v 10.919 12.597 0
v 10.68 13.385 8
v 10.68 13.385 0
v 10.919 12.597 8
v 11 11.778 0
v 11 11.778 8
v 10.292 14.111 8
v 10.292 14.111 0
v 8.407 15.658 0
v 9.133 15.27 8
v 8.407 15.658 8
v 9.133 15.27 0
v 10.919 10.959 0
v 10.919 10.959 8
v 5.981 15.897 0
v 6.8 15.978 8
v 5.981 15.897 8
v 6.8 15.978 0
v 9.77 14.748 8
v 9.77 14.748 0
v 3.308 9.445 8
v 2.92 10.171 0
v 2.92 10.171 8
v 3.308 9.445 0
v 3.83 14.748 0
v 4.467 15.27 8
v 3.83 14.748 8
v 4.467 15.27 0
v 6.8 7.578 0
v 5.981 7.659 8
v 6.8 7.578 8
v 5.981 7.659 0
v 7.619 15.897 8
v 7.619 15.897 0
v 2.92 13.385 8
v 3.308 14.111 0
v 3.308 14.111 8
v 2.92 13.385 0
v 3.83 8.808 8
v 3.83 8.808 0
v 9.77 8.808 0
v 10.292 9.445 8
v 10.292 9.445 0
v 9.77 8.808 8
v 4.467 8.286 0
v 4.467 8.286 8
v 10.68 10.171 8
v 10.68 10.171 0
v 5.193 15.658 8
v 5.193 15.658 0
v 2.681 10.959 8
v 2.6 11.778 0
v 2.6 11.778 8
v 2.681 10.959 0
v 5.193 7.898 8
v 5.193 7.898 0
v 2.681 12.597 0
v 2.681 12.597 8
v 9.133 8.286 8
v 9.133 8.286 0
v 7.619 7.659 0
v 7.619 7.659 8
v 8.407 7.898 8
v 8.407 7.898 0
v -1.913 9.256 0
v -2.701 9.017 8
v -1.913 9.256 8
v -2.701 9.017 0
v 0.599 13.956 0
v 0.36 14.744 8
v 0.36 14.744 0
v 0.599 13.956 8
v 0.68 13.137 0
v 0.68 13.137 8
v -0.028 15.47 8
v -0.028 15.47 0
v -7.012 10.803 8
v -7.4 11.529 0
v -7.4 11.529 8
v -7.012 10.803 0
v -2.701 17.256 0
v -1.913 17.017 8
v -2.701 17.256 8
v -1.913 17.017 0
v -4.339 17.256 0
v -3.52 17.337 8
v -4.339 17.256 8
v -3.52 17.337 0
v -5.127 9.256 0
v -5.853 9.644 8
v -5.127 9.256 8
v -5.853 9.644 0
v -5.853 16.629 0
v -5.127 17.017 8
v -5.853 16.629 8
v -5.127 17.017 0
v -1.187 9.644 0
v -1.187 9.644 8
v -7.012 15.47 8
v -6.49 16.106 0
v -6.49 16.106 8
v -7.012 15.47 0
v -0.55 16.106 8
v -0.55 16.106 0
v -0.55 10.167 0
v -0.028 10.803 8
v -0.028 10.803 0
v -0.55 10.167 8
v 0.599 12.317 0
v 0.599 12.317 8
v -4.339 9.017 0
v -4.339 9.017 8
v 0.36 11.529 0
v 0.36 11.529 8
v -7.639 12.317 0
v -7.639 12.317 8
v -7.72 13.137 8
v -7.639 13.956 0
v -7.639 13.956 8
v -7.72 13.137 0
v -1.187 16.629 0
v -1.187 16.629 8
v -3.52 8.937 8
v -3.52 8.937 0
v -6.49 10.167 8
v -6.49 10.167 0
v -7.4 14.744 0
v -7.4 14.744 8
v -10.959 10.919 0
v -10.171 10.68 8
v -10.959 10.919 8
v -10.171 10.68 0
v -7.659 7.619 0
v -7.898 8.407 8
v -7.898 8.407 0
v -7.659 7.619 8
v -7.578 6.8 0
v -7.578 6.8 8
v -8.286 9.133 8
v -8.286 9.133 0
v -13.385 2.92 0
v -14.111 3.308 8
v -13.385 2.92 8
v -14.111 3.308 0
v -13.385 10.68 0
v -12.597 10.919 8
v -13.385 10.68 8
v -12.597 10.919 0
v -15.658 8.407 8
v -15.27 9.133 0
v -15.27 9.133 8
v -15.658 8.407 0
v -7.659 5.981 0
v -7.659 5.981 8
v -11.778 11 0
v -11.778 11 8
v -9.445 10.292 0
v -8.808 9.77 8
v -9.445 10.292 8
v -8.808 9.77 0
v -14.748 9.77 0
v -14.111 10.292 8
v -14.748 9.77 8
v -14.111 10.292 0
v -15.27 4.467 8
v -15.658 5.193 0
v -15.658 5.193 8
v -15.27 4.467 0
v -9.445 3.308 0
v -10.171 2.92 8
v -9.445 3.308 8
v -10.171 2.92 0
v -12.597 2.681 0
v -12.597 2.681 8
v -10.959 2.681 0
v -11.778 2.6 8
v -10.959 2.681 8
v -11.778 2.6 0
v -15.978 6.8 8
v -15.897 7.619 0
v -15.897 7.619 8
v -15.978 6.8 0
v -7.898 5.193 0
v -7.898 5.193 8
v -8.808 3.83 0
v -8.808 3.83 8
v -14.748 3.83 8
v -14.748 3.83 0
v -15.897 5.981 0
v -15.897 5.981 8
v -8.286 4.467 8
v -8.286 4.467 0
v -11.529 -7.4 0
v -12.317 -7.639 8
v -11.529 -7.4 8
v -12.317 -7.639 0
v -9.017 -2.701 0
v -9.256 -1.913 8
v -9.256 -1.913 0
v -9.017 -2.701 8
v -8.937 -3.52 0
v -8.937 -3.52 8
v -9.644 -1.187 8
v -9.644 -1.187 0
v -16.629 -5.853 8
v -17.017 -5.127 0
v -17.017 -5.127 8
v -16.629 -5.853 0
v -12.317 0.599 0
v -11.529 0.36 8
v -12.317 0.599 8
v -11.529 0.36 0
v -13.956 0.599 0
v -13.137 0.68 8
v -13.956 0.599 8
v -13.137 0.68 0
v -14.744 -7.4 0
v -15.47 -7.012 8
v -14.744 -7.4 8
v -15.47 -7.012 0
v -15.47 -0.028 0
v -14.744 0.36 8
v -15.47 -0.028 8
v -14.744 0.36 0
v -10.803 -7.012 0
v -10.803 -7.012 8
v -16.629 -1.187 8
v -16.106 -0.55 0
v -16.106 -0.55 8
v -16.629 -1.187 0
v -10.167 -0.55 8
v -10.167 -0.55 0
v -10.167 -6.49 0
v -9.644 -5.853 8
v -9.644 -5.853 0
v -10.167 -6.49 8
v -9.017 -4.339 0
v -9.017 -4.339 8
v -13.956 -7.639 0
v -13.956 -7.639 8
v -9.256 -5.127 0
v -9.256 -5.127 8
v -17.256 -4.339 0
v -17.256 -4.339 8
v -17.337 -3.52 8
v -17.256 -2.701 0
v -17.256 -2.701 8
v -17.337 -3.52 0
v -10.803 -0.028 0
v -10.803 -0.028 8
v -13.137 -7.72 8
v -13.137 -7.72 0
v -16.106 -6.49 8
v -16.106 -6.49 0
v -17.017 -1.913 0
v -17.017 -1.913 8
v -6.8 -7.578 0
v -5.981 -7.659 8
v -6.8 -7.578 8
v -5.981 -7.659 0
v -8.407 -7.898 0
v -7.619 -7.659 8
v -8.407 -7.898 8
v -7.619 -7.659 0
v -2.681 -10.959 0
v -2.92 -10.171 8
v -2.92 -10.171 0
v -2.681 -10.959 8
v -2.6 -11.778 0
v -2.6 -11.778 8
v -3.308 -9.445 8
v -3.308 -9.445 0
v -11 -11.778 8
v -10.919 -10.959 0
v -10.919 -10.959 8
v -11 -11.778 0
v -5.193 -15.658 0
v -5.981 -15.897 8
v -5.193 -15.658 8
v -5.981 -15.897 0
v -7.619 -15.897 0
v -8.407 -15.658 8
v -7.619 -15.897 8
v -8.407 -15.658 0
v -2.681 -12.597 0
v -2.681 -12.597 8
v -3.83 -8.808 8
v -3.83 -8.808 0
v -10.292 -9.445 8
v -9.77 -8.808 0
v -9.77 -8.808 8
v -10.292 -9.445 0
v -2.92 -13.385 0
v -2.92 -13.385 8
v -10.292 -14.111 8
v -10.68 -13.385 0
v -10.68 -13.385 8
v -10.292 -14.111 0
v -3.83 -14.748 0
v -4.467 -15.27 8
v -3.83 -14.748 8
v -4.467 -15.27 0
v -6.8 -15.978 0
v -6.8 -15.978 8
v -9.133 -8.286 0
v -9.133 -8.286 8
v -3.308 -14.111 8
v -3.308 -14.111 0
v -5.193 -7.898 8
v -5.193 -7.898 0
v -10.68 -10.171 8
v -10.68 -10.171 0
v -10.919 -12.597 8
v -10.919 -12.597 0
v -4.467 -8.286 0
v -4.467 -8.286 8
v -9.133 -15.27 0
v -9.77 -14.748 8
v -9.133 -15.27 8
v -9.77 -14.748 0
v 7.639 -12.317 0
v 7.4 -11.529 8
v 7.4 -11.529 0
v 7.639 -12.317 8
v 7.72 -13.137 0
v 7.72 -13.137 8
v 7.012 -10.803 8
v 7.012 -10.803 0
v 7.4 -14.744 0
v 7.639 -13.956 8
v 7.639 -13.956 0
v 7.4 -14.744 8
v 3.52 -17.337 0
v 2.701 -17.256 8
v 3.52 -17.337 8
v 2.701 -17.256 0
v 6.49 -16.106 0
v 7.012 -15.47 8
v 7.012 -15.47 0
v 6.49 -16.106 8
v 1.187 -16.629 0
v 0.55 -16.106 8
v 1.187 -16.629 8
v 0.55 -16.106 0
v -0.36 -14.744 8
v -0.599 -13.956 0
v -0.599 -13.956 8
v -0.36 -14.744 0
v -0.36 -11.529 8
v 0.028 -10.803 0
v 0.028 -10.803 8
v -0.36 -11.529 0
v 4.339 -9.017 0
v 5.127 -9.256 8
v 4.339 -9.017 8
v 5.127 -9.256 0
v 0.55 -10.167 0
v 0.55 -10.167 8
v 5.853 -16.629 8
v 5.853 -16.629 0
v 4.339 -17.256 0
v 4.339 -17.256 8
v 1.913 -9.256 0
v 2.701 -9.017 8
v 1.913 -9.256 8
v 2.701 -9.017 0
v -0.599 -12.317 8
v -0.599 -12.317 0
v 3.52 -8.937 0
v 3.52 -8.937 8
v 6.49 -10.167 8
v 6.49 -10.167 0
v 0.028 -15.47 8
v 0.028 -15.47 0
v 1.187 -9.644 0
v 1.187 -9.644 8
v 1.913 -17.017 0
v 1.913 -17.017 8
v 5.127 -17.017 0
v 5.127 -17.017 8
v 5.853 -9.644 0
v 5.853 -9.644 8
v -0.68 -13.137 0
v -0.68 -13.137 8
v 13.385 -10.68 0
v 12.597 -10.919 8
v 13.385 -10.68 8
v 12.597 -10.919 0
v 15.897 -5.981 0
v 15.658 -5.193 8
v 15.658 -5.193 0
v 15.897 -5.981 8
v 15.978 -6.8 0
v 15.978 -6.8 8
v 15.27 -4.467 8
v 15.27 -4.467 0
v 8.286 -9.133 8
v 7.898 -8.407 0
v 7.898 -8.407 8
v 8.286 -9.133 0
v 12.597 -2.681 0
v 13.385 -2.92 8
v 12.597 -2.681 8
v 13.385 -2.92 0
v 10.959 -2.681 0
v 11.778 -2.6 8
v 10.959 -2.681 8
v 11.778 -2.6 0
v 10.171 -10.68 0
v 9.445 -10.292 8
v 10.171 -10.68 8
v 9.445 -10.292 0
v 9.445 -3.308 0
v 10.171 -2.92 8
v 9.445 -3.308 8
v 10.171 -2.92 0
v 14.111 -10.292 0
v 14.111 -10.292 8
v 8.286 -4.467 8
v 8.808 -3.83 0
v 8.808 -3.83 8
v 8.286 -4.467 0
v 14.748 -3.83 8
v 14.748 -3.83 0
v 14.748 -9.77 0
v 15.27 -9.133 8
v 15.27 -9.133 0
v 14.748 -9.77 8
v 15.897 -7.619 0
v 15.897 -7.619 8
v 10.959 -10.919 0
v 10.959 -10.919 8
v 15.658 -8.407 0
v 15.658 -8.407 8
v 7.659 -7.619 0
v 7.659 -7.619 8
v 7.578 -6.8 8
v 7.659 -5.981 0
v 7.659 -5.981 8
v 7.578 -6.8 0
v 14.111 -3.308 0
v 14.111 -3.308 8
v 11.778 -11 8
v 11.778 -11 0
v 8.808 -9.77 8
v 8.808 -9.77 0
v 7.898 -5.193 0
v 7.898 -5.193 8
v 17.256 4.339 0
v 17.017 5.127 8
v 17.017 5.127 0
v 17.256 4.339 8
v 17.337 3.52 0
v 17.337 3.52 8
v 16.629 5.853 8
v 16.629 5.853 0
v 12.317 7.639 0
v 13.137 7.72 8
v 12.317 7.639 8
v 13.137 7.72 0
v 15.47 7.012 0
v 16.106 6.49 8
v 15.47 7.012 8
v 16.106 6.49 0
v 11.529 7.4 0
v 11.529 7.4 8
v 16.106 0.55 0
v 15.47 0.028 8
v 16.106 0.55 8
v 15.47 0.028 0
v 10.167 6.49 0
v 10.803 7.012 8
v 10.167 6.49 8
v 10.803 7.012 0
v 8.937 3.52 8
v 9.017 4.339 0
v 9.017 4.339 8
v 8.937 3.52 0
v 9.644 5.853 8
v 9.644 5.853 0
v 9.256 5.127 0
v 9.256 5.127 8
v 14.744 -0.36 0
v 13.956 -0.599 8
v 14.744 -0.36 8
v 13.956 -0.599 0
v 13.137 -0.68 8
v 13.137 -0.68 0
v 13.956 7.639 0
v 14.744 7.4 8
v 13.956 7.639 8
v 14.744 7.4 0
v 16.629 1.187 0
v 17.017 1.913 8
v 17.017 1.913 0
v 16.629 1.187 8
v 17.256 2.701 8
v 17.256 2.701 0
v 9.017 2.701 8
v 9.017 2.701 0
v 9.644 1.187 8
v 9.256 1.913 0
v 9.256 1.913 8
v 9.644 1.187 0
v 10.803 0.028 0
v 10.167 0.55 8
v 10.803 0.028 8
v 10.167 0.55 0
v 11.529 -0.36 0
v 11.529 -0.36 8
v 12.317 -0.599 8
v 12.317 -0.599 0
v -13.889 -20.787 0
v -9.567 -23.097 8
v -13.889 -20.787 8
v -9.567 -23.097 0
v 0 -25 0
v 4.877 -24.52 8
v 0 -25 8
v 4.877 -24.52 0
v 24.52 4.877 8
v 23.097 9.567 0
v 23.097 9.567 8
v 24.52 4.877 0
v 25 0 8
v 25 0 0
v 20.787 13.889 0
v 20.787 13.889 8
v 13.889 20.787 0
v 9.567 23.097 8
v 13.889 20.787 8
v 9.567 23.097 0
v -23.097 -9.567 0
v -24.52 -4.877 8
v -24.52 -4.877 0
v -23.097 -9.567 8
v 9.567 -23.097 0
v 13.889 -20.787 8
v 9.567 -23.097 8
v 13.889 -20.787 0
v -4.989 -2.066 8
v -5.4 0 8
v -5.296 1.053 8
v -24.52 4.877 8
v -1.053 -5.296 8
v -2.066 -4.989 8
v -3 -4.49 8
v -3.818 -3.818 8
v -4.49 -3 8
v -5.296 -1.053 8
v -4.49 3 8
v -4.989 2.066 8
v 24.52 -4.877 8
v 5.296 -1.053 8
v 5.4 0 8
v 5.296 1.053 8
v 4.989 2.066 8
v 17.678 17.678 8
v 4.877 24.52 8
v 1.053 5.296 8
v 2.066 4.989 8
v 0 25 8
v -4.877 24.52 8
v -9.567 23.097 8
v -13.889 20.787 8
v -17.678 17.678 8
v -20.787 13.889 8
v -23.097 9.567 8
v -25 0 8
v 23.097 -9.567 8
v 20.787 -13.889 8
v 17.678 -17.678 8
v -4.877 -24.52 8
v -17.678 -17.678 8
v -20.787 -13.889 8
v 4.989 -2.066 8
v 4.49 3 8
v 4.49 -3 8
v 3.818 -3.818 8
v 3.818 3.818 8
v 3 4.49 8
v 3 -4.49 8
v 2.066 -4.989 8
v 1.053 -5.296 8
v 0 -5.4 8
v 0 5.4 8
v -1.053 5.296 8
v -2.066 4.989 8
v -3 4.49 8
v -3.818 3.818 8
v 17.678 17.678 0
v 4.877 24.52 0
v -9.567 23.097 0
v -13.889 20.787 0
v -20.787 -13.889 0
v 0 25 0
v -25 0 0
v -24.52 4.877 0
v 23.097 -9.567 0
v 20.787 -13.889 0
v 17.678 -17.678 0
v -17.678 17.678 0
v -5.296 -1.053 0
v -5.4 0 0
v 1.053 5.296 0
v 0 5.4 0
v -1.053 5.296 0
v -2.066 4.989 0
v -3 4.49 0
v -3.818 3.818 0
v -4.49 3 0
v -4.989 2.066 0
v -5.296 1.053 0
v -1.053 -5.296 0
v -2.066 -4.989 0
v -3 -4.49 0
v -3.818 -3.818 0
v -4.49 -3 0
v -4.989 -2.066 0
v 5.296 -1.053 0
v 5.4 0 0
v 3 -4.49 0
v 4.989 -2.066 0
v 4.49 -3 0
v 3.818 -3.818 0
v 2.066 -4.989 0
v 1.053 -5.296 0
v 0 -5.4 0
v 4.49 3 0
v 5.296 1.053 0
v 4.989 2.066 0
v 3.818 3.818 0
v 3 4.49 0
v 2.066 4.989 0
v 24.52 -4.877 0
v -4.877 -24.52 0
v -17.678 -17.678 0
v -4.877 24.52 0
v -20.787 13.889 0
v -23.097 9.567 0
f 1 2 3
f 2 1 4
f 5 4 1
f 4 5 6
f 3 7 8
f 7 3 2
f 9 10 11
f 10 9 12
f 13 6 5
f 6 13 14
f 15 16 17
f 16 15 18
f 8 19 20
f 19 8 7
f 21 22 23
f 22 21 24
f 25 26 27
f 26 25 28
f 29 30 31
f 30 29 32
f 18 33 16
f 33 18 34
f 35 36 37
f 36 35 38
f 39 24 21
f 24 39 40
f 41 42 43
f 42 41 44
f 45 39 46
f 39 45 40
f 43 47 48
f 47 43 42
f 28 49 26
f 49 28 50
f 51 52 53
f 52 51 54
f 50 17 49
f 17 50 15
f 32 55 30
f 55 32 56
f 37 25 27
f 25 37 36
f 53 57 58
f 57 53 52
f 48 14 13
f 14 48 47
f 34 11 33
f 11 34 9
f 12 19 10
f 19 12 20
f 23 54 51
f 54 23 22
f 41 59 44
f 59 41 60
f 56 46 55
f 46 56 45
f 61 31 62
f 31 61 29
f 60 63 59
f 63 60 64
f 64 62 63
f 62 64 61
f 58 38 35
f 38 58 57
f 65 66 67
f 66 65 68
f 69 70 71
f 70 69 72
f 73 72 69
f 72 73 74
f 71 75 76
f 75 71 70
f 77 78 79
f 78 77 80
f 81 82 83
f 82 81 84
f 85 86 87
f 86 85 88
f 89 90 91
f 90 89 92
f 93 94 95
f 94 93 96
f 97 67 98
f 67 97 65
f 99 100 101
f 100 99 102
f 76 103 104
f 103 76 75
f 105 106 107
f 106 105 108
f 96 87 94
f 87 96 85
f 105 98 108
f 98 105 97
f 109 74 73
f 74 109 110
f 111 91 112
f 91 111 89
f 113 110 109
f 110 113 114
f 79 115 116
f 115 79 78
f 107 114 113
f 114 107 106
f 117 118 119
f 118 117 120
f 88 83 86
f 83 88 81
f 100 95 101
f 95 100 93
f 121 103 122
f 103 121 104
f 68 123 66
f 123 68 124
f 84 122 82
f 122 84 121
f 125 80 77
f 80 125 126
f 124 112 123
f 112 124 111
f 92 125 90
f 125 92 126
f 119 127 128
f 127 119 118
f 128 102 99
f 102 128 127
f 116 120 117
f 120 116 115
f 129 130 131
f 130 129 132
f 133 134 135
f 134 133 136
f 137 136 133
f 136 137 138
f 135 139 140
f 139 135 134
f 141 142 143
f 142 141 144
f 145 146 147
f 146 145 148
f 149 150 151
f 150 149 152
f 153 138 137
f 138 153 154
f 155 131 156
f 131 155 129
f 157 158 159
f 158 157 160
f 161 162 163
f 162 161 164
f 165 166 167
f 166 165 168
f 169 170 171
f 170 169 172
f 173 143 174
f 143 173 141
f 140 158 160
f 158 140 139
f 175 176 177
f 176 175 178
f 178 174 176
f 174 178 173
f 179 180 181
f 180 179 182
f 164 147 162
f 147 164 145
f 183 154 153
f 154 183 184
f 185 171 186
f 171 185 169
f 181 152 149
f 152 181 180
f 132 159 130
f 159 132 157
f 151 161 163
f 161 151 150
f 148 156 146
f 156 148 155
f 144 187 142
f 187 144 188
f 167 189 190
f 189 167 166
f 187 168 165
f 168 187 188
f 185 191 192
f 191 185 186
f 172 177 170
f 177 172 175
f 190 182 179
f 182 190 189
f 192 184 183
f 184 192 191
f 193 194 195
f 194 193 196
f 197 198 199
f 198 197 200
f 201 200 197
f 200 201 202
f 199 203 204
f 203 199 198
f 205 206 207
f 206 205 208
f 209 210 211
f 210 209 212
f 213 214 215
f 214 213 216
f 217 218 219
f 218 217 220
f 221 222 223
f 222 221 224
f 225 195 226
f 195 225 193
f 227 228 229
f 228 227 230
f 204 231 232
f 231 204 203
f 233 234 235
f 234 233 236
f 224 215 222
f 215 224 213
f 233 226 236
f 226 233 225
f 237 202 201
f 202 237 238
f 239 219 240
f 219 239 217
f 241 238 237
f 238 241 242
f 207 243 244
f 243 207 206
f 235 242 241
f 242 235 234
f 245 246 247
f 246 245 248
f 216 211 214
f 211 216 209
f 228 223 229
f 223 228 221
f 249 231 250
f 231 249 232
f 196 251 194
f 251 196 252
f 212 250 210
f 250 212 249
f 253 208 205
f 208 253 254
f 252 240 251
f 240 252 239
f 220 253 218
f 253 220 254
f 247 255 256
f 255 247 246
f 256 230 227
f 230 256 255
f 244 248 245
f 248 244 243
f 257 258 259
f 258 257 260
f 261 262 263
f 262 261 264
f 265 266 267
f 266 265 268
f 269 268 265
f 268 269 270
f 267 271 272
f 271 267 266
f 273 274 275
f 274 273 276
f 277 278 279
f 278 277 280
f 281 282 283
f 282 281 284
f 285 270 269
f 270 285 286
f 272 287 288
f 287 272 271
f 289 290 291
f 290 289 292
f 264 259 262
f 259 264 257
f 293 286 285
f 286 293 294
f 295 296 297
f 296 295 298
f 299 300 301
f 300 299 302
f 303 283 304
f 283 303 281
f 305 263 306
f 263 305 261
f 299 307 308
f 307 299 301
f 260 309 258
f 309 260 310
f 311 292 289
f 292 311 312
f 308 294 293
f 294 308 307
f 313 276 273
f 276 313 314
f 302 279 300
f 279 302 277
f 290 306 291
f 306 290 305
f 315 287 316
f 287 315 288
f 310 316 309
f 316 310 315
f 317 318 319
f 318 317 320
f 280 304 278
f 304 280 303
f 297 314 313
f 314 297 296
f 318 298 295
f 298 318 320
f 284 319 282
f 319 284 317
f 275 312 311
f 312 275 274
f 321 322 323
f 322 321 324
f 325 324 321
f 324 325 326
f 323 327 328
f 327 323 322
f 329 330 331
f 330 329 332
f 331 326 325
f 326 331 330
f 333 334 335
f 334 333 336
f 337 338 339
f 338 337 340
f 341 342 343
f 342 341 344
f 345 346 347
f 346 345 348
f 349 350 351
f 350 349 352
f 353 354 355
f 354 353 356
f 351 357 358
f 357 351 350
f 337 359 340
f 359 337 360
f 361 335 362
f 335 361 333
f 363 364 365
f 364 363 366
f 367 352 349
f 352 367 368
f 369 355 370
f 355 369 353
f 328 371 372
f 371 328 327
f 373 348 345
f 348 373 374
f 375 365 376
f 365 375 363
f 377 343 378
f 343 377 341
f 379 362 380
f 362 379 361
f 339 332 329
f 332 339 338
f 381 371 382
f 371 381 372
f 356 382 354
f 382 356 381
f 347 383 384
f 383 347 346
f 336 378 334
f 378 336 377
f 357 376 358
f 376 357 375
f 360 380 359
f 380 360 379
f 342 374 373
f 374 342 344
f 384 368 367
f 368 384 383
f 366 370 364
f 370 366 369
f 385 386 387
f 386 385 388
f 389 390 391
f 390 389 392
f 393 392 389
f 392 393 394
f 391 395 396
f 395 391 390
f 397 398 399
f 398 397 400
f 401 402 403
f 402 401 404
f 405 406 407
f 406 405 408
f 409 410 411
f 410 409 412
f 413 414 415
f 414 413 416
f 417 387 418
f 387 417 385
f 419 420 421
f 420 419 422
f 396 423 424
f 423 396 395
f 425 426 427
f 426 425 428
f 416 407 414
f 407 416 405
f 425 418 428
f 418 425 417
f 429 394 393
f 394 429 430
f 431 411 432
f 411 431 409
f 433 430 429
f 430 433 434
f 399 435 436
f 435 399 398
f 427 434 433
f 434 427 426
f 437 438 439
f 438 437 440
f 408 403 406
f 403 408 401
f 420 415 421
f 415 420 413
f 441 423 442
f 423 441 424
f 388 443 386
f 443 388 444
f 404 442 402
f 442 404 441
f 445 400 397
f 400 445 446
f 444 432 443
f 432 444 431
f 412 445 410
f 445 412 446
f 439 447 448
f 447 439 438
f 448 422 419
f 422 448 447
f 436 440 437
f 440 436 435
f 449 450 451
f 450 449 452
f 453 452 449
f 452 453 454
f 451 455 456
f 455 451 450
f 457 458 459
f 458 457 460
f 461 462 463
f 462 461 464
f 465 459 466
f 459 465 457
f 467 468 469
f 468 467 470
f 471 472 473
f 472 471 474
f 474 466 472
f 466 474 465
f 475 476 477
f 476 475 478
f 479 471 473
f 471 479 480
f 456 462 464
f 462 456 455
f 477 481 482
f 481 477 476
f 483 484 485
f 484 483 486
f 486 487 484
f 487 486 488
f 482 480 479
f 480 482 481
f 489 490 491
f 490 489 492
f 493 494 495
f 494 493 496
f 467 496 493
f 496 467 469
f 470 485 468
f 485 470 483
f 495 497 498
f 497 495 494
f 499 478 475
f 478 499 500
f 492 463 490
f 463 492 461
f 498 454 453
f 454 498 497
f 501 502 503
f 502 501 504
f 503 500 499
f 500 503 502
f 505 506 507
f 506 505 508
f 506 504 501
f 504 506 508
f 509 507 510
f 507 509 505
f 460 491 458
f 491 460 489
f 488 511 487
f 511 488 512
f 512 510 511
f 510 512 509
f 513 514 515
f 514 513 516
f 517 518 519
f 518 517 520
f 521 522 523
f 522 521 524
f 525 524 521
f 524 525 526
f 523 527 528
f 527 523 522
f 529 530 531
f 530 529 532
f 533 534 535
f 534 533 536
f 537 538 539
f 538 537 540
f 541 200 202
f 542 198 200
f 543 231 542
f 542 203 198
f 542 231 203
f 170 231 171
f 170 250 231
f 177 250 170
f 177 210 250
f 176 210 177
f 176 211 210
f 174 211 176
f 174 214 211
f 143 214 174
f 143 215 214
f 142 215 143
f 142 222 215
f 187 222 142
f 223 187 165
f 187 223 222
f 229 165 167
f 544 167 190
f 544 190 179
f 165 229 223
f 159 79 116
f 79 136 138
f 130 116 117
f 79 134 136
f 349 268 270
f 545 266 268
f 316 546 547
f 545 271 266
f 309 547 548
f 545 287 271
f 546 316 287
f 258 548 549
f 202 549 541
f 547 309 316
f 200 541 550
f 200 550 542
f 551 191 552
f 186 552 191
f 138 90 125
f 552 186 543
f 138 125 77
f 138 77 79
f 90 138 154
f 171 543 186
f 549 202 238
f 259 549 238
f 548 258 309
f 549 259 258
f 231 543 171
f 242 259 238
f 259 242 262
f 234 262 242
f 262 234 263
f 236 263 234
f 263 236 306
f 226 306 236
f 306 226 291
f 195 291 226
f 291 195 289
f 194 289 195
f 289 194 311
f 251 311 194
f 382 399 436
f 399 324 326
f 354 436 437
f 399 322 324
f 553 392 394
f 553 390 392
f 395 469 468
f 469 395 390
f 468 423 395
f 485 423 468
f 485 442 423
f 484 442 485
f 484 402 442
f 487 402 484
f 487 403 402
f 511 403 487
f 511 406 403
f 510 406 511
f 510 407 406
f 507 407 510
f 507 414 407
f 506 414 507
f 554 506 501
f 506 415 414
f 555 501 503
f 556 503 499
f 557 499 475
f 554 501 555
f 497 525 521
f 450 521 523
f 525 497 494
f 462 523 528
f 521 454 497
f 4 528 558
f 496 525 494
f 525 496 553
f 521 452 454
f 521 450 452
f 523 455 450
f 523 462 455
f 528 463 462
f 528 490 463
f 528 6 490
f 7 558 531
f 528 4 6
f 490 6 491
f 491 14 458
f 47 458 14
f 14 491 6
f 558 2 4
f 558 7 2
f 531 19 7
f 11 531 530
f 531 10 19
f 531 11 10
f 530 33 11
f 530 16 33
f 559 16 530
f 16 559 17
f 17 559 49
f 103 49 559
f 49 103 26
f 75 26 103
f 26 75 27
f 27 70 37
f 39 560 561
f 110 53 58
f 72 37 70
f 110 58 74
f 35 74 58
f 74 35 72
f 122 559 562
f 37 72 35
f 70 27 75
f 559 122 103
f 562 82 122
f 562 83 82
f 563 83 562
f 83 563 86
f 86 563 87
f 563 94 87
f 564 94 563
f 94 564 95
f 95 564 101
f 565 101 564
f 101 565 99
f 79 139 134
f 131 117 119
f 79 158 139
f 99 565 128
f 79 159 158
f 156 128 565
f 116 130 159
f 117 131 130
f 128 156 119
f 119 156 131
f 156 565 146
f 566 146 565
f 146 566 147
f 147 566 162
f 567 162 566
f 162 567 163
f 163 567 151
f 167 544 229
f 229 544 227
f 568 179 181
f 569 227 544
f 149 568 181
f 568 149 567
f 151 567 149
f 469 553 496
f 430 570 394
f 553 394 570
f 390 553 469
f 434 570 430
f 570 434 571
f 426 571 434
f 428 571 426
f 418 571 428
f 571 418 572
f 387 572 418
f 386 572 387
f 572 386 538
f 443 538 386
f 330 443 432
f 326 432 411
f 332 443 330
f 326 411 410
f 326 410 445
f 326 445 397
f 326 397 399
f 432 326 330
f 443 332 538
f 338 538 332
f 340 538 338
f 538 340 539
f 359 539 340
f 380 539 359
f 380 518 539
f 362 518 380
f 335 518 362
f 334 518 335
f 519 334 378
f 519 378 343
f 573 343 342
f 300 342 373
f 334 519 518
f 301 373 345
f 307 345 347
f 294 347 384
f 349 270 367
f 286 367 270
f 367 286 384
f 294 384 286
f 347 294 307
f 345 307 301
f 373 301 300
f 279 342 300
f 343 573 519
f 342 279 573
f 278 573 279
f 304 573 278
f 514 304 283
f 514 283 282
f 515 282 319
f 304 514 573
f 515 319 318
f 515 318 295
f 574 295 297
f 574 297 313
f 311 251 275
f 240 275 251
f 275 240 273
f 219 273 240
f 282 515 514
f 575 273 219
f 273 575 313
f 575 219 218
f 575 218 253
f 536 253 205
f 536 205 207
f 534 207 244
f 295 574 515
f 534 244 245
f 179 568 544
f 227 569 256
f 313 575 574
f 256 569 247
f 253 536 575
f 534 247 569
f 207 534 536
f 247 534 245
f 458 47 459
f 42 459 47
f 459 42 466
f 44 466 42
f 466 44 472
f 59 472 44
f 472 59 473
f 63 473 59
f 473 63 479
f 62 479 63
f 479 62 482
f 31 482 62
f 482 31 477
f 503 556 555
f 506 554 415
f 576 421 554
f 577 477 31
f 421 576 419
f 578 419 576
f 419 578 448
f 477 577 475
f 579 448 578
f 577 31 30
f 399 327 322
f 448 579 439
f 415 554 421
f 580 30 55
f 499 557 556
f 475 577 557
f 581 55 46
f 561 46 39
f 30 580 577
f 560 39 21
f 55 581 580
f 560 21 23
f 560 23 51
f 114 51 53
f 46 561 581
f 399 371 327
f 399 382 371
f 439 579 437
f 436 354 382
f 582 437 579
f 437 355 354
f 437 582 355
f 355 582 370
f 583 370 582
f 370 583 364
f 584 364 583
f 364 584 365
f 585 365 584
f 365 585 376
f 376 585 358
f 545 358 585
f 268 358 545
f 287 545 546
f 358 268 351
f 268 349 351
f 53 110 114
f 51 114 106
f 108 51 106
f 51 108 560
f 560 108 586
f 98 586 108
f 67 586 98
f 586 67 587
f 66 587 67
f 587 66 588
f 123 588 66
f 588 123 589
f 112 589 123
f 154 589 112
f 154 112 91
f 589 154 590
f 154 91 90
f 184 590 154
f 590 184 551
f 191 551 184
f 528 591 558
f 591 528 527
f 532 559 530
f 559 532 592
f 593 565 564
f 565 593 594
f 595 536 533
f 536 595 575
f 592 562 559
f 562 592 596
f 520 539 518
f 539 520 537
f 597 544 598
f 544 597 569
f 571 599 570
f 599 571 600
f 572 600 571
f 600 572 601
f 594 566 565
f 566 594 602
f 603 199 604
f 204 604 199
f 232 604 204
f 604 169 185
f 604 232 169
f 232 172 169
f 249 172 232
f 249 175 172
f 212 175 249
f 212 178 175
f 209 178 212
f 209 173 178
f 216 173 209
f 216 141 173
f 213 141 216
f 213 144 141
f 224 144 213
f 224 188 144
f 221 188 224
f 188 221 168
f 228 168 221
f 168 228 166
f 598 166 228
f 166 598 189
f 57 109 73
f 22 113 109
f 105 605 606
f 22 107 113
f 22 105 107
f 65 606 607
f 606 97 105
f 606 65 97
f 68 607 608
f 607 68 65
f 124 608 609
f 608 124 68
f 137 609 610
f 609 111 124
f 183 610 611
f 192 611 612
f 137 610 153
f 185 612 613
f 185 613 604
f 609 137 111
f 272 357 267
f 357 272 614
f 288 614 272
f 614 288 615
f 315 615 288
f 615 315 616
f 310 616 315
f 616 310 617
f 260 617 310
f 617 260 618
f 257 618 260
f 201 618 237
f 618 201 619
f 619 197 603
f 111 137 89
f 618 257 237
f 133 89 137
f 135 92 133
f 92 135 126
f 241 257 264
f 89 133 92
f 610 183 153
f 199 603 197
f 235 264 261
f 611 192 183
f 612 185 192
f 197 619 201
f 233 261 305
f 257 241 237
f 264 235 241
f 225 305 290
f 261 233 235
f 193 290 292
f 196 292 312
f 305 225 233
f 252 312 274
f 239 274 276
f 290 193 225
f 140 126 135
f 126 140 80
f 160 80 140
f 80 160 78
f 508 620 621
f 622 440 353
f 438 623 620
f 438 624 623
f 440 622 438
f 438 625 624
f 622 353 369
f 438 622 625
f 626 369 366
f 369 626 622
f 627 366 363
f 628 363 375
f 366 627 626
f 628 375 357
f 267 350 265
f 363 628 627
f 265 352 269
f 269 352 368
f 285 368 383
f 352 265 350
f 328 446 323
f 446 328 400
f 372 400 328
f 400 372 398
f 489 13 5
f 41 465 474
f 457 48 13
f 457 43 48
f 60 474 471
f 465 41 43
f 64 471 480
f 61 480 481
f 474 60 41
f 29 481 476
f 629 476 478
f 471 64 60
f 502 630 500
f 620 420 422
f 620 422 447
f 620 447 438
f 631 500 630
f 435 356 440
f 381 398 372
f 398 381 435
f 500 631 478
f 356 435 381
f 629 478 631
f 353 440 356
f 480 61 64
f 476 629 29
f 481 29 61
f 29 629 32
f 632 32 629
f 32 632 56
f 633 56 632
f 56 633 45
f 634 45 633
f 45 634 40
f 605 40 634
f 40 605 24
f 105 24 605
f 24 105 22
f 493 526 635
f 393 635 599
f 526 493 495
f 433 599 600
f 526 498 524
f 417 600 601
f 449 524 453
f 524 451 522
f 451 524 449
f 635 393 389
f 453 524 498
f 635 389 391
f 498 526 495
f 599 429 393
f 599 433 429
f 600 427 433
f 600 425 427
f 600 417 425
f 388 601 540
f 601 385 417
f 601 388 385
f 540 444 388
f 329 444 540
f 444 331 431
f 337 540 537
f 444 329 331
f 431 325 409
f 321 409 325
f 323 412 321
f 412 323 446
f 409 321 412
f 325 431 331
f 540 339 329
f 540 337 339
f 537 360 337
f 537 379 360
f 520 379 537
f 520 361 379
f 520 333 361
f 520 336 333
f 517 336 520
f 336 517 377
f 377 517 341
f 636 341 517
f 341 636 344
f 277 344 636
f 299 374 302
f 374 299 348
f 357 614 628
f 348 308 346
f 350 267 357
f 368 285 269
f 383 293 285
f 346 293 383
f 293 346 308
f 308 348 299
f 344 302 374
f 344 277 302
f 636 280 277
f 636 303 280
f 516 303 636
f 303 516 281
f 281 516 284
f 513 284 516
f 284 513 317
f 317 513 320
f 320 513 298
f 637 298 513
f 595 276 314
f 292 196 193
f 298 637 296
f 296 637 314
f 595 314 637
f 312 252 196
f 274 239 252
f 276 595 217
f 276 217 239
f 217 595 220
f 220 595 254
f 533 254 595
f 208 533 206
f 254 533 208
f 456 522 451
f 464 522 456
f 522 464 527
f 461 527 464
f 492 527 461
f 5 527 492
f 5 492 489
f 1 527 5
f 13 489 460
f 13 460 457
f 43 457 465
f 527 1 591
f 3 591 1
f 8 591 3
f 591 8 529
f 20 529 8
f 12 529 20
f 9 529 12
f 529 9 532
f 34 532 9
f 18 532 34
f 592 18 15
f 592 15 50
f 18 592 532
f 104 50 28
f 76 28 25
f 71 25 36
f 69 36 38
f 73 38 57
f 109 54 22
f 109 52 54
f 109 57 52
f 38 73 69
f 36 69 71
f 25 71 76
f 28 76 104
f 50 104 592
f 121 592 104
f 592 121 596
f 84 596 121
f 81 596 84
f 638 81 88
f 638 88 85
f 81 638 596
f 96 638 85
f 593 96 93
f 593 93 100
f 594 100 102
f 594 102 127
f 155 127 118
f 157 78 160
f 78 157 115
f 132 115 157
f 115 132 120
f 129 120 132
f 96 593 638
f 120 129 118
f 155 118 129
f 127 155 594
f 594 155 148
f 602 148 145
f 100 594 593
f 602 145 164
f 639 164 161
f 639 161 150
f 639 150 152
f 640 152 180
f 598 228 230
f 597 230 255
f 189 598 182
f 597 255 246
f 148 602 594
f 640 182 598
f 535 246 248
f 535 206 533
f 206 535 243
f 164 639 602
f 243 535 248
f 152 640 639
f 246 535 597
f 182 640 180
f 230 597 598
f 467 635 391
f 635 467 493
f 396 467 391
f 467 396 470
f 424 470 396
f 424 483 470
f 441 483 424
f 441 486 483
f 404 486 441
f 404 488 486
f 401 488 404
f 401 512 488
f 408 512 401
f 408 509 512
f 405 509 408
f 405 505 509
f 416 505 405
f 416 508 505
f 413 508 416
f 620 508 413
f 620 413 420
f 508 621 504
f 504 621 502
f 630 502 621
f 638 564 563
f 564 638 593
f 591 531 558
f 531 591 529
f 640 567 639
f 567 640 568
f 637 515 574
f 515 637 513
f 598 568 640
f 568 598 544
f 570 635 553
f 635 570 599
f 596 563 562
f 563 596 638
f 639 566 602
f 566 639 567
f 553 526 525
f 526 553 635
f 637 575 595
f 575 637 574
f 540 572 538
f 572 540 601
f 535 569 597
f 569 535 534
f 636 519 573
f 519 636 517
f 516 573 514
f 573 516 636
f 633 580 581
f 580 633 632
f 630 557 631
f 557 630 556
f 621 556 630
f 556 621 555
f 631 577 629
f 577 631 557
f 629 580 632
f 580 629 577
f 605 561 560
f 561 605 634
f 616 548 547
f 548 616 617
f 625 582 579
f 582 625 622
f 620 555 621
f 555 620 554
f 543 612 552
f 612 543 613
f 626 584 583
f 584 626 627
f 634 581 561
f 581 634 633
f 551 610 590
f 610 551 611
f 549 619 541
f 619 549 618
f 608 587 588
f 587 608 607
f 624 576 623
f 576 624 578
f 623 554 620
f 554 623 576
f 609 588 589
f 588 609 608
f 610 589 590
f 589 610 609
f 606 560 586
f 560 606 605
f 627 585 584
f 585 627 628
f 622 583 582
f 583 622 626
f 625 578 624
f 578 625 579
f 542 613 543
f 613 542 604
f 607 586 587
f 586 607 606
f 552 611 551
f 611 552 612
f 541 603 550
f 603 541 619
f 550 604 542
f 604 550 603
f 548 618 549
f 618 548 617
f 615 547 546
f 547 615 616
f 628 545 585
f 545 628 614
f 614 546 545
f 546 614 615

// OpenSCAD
$fn = 32;

// ----------------------------------------------------------------------
// Flange Ø50 x 8
// 8 holes on a Ø27.2 bolt circle, bolted joints
// ----------------------------------------------------------------------

// --- parameters (mm) ---
flange_d = 50;   // outside diameter of the flange
thickness = 8;   // flange thickness
holes = 8;       // number of bolt holes
pcd = 27.2;      // bolt circle diameter
start_deg = 60;  // angle of the first hole, from +X
hole_d = 8.4;    // bolt hole diameter
bore_d = 10.8;   // central through bore
hub_d = 18.8;    // hub outside diameter
hub_h = 0;       // hub height above the flange face (0 = no hub)

// --- derived feature positions (mm) ---
height = thickness + hub_h;  // = 8   overall height of the part
pcd_r = pcd / 2;             // = 13.6   bolt circle radius
hole_step = 360 / holes;     // = 45   angular pitch
feature_centers = [
  [pcd_r * cos(start_deg + 0 * hole_step), pcd_r * sin(start_deg + 0 * hole_step)],
  [pcd_r * cos(start_deg + 1 * hole_step), pcd_r * sin(start_deg + 1 * hole_step)],
  [pcd_r * cos(start_deg + 2 * hole_step), pcd_r * sin(start_deg + 2 * hole_step)],
  [pcd_r * cos(start_deg + 3 * hole_step), pcd_r * sin(start_deg + 3 * hole_step)],
  [pcd_r * cos(start_deg + 4 * hole_step), pcd_r * sin(start_deg + 4 * hole_step)],
  [pcd_r * cos(start_deg + 5 * hole_step), pcd_r * sin(start_deg + 5 * hole_step)],
  [pcd_r * cos(start_deg + 6 * hole_step), pcd_r * sin(start_deg + 6 * hole_step)],
  [pcd_r * cos(start_deg + 7 * hole_step), pcd_r * sin(start_deg + 7 * hole_step)]
];   // bolt hole centres on the pitch circle

// flange disc, every hole and the bore cut straight through
difference() {
  union() {
    cylinder(d = flange_d, h = thickness);
  }
  translate([0, 0, -1]) cylinder(d = bore_d, h = height + 2);  // bore, through
  for (centre = feature_centers)
    translate([centre[0], centre[1], -1]) cylinder(d = hole_d, h = thickness + 2);
}
